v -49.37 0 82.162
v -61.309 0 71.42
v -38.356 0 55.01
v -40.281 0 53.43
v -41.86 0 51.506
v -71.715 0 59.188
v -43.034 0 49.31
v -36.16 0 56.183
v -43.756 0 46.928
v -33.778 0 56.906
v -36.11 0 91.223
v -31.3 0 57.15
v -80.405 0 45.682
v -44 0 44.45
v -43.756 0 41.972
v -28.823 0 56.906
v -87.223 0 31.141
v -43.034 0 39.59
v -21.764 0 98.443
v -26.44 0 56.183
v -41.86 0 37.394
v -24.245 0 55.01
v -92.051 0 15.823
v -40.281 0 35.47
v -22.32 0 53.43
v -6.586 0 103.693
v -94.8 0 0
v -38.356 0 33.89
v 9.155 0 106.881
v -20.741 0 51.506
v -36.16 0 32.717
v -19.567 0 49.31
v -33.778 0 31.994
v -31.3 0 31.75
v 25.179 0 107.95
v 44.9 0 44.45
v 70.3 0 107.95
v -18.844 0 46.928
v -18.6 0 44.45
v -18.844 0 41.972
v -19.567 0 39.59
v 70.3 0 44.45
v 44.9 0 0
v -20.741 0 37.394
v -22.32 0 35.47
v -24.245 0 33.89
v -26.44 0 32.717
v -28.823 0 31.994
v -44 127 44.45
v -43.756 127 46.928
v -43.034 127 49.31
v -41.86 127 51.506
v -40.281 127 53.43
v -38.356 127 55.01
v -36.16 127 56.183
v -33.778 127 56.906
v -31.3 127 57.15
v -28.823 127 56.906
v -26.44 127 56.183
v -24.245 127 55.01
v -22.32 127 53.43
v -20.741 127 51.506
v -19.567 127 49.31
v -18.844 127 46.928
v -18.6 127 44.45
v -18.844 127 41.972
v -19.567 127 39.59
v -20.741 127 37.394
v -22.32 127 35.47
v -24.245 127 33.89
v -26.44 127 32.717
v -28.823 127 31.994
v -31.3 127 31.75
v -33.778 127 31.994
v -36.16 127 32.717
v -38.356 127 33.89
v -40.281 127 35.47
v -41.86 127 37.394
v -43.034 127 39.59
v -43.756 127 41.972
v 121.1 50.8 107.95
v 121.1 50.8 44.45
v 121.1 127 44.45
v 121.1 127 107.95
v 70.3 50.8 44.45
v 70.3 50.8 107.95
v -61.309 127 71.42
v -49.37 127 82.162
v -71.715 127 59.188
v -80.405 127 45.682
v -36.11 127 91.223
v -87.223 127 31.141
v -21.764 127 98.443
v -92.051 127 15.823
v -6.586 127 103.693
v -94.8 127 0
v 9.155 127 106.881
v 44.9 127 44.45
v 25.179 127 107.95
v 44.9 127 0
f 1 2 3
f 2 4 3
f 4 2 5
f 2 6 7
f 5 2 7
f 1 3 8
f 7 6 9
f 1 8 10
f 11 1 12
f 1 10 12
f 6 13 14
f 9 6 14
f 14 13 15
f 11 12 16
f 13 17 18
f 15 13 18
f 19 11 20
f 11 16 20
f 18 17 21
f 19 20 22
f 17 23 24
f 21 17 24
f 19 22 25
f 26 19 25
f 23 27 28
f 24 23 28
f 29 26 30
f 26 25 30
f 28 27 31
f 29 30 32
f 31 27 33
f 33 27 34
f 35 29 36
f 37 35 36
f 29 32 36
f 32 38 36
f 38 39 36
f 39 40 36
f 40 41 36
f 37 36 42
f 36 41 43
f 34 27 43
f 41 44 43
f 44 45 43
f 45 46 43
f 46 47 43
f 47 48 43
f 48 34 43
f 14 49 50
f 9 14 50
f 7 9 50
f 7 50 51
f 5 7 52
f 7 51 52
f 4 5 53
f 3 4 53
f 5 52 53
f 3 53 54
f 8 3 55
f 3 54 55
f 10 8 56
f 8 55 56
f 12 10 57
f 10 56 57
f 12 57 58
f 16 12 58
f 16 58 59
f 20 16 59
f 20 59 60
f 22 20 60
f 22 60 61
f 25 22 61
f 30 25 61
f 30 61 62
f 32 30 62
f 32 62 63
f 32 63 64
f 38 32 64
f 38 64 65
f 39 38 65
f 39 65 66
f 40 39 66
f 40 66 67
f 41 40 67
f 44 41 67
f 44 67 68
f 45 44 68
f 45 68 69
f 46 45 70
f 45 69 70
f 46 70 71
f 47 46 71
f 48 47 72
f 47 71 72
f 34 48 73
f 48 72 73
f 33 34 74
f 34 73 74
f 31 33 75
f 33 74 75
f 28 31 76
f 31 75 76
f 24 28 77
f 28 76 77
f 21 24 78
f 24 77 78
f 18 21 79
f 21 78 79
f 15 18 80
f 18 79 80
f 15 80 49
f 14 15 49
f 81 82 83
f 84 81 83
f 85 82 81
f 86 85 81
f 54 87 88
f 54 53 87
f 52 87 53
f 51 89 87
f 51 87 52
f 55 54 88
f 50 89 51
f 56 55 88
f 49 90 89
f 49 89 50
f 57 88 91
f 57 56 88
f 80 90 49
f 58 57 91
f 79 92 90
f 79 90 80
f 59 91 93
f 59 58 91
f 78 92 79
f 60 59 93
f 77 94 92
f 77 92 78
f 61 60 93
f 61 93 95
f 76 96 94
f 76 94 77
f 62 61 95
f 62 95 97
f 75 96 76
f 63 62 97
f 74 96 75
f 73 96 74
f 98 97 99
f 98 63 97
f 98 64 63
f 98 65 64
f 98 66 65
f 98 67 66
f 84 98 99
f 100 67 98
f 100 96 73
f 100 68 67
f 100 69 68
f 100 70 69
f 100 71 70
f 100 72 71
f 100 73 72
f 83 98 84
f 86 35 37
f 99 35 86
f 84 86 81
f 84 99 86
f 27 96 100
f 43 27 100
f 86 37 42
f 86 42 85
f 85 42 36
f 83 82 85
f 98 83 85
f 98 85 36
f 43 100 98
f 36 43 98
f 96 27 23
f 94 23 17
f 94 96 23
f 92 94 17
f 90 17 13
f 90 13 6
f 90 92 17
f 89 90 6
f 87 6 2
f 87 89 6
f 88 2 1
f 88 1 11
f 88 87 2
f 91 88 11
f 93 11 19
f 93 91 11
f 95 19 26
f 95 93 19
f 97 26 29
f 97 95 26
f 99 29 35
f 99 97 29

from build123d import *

# Parameters (mm, degrees)
F0_W         = 215.9
F0_H         = 127
F1_DEPTH     = 82.55
F2_W         = 76.2
F2_H         = 44.45
F3_DEPTH     = 127.001
F4_W         = 50.8
F4_H         = 37.5581905246
F5_DEPTH     = 82.551
F6_R         = 7.8160058593
F7_DEPTH     = 0.254
F8_R         = 12.7
F9_DEPTH     = 127.001
F10_T1_DEPTH = 699.3812649799
F11_DEPTH    = 107.95
F14_W        = 76.2
F14_H        = 44.45
F15_DEPTH    = 127.001
F13_W        = 50.8
F13_H        = 63.5
F16_DEPTH    = 50.8
F17_R        = 12.7
F18_DEPTH    = 127.001
F19_T1_DEPTH = 726.8985851792


# Not quite as in the source:
# - a fillet or chamfer that OpenCascade refuses, or shapes differently, is made with other operations: its cross-section is extruded or revolved along the edge and cut away or added


with BuildPart() as f1:
    # F0 (on Top) → F1 (new body)
    with BuildSketch(Plane.XY):
        with Locations((13.1497114167, 63.5)):
            Rectangle(F0_W, F0_H)
    extrude(amount=F1_DEPTH)

    # F2 (on face) → F3 (cut, through all)
    with BuildSketch(Plane(origin=(0, 127, 0), x_dir=(-1, 0, 0), z_dir=(0, 1, 0))):
        with Locations((-82.9997114167, 22.225)):
            Rectangle(F2_W, F2_H)
    extrude(amount=-F3_DEPTH, mode=Mode.SUBTRACT)

    # F4 (on face) → F5 (cut, through all)
    with BuildSketch(Plane.XY.offset(82.55)):
        with Locations((95.6997114167, 18.7790952623)):
            Rectangle(F4_W, F4_H)
    extrude(amount=-F5_DEPTH, mode=Mode.SUBTRACT)

    # F6 (on face) → F7 (cut)
    with BuildSketch(Plane.YZ.offset(121.0997114167)):
        with Locations((84.554515779, 63.2054284215)):
            Circle(F6_R)
    extrude(amount=-F7_DEPTH, mode=Mode.SUBTRACT)

    # F8 (on face) → F9 (cut, through all)
    with BuildSketch(Plane(origin=(0, 127, 0), x_dir=(-1, 0, 0), z_dir=(0, 1, 0))):
        with Locations((31.3002885833, 44.45)):
            Circle(F8_R)
    extrude(amount=-F9_DEPTH, mode=Mode.SUBTRACT)

    # F10: fillet of radius 120.65 on 1 edges, made by hand

    # F10_s2 → F10_t1 (cut)
    with BuildSketch(Plane.XZ.offset(-413.19063249)):
        with BuildLine():
            ThreePointArc((-94.8002885833, 0), (-50.8919372849, 59.7600722971), (19.6759644126, 82.55))
            Line((19.6759644126, 82.55), (19.6759644126, 84.963))
            Line((19.6759644126, 84.963), (-94.8002885833, 84.963))
            Line((-94.8002885833, 84.963), (-97.2132885833, 82.55))
            ThreePointArc((-97.2132885833, 82.55), (-97.2132885833, 41.275), (-97.0898136433, 0.762))
            Line((-97.0898136433, 0.762), (-94.8002885833, 0))
        make_face()
    extrude(amount=F10_T1_DEPTH, mode=Mode.SUBTRACT)

    # F0 (on Top) → F11 (join)
    with BuildSketch(Plane.XY):
        with Locations((13.1497114167, 63.5)):
            Rectangle(F0_W, F0_H)
    extrude(amount=F11_DEPTH)

    # F14 (on face) → F15 (cut, through all)
    with BuildSketch(Plane(origin=(0, 127, 0), x_dir=(-1, 0, 0), z_dir=(0, 1, 0))):
        with Locations((-82.9997114167, 22.225)):
            Rectangle(F14_W, F14_H)
    extrude(amount=-F15_DEPTH, mode=Mode.SUBTRACT)

    # F13 (on face) → F16 (cut)
    with BuildSketch(Plane.YZ.offset(121.0997114167)):
        with Locations((25.4, 76.2)):
            Rectangle(F13_W, F13_H)
    extrude(amount=-F16_DEPTH, mode=Mode.SUBTRACT)

    # F17 (on face) → F18 (cut, through all)
    with BuildSketch(Plane(origin=(0, 127, 0), x_dir=(-1, 0, 0), z_dir=(0, 1, 0))):
        with Locations((31.3002885833, 44.45)):
            Circle(F17_R)
    extrude(amount=-F18_DEPTH, mode=Mode.SUBTRACT)

    # F19: fillet of radius 120.65 on 1 edges, made by hand

    # F19_s2 → F19_t1 (cut)
    with BuildSketch(Plane.XZ.offset(-426.9492925896)):
        with BuildLine():
            ThreePointArc((-94.8002885833, 0), (-55.5180544698, 76.9902377631), (25.1794284525, 107.95))
            Line((25.1794284525, 107.95), (-94.8002885833, 107.95))
            Line((-94.8002885833, 107.95), (-94.8002885833, 0))
        make_face()
    extrude(amount=F19_T1_DEPTH, mode=Mode.SUBTRACT)


solid = f1.part
